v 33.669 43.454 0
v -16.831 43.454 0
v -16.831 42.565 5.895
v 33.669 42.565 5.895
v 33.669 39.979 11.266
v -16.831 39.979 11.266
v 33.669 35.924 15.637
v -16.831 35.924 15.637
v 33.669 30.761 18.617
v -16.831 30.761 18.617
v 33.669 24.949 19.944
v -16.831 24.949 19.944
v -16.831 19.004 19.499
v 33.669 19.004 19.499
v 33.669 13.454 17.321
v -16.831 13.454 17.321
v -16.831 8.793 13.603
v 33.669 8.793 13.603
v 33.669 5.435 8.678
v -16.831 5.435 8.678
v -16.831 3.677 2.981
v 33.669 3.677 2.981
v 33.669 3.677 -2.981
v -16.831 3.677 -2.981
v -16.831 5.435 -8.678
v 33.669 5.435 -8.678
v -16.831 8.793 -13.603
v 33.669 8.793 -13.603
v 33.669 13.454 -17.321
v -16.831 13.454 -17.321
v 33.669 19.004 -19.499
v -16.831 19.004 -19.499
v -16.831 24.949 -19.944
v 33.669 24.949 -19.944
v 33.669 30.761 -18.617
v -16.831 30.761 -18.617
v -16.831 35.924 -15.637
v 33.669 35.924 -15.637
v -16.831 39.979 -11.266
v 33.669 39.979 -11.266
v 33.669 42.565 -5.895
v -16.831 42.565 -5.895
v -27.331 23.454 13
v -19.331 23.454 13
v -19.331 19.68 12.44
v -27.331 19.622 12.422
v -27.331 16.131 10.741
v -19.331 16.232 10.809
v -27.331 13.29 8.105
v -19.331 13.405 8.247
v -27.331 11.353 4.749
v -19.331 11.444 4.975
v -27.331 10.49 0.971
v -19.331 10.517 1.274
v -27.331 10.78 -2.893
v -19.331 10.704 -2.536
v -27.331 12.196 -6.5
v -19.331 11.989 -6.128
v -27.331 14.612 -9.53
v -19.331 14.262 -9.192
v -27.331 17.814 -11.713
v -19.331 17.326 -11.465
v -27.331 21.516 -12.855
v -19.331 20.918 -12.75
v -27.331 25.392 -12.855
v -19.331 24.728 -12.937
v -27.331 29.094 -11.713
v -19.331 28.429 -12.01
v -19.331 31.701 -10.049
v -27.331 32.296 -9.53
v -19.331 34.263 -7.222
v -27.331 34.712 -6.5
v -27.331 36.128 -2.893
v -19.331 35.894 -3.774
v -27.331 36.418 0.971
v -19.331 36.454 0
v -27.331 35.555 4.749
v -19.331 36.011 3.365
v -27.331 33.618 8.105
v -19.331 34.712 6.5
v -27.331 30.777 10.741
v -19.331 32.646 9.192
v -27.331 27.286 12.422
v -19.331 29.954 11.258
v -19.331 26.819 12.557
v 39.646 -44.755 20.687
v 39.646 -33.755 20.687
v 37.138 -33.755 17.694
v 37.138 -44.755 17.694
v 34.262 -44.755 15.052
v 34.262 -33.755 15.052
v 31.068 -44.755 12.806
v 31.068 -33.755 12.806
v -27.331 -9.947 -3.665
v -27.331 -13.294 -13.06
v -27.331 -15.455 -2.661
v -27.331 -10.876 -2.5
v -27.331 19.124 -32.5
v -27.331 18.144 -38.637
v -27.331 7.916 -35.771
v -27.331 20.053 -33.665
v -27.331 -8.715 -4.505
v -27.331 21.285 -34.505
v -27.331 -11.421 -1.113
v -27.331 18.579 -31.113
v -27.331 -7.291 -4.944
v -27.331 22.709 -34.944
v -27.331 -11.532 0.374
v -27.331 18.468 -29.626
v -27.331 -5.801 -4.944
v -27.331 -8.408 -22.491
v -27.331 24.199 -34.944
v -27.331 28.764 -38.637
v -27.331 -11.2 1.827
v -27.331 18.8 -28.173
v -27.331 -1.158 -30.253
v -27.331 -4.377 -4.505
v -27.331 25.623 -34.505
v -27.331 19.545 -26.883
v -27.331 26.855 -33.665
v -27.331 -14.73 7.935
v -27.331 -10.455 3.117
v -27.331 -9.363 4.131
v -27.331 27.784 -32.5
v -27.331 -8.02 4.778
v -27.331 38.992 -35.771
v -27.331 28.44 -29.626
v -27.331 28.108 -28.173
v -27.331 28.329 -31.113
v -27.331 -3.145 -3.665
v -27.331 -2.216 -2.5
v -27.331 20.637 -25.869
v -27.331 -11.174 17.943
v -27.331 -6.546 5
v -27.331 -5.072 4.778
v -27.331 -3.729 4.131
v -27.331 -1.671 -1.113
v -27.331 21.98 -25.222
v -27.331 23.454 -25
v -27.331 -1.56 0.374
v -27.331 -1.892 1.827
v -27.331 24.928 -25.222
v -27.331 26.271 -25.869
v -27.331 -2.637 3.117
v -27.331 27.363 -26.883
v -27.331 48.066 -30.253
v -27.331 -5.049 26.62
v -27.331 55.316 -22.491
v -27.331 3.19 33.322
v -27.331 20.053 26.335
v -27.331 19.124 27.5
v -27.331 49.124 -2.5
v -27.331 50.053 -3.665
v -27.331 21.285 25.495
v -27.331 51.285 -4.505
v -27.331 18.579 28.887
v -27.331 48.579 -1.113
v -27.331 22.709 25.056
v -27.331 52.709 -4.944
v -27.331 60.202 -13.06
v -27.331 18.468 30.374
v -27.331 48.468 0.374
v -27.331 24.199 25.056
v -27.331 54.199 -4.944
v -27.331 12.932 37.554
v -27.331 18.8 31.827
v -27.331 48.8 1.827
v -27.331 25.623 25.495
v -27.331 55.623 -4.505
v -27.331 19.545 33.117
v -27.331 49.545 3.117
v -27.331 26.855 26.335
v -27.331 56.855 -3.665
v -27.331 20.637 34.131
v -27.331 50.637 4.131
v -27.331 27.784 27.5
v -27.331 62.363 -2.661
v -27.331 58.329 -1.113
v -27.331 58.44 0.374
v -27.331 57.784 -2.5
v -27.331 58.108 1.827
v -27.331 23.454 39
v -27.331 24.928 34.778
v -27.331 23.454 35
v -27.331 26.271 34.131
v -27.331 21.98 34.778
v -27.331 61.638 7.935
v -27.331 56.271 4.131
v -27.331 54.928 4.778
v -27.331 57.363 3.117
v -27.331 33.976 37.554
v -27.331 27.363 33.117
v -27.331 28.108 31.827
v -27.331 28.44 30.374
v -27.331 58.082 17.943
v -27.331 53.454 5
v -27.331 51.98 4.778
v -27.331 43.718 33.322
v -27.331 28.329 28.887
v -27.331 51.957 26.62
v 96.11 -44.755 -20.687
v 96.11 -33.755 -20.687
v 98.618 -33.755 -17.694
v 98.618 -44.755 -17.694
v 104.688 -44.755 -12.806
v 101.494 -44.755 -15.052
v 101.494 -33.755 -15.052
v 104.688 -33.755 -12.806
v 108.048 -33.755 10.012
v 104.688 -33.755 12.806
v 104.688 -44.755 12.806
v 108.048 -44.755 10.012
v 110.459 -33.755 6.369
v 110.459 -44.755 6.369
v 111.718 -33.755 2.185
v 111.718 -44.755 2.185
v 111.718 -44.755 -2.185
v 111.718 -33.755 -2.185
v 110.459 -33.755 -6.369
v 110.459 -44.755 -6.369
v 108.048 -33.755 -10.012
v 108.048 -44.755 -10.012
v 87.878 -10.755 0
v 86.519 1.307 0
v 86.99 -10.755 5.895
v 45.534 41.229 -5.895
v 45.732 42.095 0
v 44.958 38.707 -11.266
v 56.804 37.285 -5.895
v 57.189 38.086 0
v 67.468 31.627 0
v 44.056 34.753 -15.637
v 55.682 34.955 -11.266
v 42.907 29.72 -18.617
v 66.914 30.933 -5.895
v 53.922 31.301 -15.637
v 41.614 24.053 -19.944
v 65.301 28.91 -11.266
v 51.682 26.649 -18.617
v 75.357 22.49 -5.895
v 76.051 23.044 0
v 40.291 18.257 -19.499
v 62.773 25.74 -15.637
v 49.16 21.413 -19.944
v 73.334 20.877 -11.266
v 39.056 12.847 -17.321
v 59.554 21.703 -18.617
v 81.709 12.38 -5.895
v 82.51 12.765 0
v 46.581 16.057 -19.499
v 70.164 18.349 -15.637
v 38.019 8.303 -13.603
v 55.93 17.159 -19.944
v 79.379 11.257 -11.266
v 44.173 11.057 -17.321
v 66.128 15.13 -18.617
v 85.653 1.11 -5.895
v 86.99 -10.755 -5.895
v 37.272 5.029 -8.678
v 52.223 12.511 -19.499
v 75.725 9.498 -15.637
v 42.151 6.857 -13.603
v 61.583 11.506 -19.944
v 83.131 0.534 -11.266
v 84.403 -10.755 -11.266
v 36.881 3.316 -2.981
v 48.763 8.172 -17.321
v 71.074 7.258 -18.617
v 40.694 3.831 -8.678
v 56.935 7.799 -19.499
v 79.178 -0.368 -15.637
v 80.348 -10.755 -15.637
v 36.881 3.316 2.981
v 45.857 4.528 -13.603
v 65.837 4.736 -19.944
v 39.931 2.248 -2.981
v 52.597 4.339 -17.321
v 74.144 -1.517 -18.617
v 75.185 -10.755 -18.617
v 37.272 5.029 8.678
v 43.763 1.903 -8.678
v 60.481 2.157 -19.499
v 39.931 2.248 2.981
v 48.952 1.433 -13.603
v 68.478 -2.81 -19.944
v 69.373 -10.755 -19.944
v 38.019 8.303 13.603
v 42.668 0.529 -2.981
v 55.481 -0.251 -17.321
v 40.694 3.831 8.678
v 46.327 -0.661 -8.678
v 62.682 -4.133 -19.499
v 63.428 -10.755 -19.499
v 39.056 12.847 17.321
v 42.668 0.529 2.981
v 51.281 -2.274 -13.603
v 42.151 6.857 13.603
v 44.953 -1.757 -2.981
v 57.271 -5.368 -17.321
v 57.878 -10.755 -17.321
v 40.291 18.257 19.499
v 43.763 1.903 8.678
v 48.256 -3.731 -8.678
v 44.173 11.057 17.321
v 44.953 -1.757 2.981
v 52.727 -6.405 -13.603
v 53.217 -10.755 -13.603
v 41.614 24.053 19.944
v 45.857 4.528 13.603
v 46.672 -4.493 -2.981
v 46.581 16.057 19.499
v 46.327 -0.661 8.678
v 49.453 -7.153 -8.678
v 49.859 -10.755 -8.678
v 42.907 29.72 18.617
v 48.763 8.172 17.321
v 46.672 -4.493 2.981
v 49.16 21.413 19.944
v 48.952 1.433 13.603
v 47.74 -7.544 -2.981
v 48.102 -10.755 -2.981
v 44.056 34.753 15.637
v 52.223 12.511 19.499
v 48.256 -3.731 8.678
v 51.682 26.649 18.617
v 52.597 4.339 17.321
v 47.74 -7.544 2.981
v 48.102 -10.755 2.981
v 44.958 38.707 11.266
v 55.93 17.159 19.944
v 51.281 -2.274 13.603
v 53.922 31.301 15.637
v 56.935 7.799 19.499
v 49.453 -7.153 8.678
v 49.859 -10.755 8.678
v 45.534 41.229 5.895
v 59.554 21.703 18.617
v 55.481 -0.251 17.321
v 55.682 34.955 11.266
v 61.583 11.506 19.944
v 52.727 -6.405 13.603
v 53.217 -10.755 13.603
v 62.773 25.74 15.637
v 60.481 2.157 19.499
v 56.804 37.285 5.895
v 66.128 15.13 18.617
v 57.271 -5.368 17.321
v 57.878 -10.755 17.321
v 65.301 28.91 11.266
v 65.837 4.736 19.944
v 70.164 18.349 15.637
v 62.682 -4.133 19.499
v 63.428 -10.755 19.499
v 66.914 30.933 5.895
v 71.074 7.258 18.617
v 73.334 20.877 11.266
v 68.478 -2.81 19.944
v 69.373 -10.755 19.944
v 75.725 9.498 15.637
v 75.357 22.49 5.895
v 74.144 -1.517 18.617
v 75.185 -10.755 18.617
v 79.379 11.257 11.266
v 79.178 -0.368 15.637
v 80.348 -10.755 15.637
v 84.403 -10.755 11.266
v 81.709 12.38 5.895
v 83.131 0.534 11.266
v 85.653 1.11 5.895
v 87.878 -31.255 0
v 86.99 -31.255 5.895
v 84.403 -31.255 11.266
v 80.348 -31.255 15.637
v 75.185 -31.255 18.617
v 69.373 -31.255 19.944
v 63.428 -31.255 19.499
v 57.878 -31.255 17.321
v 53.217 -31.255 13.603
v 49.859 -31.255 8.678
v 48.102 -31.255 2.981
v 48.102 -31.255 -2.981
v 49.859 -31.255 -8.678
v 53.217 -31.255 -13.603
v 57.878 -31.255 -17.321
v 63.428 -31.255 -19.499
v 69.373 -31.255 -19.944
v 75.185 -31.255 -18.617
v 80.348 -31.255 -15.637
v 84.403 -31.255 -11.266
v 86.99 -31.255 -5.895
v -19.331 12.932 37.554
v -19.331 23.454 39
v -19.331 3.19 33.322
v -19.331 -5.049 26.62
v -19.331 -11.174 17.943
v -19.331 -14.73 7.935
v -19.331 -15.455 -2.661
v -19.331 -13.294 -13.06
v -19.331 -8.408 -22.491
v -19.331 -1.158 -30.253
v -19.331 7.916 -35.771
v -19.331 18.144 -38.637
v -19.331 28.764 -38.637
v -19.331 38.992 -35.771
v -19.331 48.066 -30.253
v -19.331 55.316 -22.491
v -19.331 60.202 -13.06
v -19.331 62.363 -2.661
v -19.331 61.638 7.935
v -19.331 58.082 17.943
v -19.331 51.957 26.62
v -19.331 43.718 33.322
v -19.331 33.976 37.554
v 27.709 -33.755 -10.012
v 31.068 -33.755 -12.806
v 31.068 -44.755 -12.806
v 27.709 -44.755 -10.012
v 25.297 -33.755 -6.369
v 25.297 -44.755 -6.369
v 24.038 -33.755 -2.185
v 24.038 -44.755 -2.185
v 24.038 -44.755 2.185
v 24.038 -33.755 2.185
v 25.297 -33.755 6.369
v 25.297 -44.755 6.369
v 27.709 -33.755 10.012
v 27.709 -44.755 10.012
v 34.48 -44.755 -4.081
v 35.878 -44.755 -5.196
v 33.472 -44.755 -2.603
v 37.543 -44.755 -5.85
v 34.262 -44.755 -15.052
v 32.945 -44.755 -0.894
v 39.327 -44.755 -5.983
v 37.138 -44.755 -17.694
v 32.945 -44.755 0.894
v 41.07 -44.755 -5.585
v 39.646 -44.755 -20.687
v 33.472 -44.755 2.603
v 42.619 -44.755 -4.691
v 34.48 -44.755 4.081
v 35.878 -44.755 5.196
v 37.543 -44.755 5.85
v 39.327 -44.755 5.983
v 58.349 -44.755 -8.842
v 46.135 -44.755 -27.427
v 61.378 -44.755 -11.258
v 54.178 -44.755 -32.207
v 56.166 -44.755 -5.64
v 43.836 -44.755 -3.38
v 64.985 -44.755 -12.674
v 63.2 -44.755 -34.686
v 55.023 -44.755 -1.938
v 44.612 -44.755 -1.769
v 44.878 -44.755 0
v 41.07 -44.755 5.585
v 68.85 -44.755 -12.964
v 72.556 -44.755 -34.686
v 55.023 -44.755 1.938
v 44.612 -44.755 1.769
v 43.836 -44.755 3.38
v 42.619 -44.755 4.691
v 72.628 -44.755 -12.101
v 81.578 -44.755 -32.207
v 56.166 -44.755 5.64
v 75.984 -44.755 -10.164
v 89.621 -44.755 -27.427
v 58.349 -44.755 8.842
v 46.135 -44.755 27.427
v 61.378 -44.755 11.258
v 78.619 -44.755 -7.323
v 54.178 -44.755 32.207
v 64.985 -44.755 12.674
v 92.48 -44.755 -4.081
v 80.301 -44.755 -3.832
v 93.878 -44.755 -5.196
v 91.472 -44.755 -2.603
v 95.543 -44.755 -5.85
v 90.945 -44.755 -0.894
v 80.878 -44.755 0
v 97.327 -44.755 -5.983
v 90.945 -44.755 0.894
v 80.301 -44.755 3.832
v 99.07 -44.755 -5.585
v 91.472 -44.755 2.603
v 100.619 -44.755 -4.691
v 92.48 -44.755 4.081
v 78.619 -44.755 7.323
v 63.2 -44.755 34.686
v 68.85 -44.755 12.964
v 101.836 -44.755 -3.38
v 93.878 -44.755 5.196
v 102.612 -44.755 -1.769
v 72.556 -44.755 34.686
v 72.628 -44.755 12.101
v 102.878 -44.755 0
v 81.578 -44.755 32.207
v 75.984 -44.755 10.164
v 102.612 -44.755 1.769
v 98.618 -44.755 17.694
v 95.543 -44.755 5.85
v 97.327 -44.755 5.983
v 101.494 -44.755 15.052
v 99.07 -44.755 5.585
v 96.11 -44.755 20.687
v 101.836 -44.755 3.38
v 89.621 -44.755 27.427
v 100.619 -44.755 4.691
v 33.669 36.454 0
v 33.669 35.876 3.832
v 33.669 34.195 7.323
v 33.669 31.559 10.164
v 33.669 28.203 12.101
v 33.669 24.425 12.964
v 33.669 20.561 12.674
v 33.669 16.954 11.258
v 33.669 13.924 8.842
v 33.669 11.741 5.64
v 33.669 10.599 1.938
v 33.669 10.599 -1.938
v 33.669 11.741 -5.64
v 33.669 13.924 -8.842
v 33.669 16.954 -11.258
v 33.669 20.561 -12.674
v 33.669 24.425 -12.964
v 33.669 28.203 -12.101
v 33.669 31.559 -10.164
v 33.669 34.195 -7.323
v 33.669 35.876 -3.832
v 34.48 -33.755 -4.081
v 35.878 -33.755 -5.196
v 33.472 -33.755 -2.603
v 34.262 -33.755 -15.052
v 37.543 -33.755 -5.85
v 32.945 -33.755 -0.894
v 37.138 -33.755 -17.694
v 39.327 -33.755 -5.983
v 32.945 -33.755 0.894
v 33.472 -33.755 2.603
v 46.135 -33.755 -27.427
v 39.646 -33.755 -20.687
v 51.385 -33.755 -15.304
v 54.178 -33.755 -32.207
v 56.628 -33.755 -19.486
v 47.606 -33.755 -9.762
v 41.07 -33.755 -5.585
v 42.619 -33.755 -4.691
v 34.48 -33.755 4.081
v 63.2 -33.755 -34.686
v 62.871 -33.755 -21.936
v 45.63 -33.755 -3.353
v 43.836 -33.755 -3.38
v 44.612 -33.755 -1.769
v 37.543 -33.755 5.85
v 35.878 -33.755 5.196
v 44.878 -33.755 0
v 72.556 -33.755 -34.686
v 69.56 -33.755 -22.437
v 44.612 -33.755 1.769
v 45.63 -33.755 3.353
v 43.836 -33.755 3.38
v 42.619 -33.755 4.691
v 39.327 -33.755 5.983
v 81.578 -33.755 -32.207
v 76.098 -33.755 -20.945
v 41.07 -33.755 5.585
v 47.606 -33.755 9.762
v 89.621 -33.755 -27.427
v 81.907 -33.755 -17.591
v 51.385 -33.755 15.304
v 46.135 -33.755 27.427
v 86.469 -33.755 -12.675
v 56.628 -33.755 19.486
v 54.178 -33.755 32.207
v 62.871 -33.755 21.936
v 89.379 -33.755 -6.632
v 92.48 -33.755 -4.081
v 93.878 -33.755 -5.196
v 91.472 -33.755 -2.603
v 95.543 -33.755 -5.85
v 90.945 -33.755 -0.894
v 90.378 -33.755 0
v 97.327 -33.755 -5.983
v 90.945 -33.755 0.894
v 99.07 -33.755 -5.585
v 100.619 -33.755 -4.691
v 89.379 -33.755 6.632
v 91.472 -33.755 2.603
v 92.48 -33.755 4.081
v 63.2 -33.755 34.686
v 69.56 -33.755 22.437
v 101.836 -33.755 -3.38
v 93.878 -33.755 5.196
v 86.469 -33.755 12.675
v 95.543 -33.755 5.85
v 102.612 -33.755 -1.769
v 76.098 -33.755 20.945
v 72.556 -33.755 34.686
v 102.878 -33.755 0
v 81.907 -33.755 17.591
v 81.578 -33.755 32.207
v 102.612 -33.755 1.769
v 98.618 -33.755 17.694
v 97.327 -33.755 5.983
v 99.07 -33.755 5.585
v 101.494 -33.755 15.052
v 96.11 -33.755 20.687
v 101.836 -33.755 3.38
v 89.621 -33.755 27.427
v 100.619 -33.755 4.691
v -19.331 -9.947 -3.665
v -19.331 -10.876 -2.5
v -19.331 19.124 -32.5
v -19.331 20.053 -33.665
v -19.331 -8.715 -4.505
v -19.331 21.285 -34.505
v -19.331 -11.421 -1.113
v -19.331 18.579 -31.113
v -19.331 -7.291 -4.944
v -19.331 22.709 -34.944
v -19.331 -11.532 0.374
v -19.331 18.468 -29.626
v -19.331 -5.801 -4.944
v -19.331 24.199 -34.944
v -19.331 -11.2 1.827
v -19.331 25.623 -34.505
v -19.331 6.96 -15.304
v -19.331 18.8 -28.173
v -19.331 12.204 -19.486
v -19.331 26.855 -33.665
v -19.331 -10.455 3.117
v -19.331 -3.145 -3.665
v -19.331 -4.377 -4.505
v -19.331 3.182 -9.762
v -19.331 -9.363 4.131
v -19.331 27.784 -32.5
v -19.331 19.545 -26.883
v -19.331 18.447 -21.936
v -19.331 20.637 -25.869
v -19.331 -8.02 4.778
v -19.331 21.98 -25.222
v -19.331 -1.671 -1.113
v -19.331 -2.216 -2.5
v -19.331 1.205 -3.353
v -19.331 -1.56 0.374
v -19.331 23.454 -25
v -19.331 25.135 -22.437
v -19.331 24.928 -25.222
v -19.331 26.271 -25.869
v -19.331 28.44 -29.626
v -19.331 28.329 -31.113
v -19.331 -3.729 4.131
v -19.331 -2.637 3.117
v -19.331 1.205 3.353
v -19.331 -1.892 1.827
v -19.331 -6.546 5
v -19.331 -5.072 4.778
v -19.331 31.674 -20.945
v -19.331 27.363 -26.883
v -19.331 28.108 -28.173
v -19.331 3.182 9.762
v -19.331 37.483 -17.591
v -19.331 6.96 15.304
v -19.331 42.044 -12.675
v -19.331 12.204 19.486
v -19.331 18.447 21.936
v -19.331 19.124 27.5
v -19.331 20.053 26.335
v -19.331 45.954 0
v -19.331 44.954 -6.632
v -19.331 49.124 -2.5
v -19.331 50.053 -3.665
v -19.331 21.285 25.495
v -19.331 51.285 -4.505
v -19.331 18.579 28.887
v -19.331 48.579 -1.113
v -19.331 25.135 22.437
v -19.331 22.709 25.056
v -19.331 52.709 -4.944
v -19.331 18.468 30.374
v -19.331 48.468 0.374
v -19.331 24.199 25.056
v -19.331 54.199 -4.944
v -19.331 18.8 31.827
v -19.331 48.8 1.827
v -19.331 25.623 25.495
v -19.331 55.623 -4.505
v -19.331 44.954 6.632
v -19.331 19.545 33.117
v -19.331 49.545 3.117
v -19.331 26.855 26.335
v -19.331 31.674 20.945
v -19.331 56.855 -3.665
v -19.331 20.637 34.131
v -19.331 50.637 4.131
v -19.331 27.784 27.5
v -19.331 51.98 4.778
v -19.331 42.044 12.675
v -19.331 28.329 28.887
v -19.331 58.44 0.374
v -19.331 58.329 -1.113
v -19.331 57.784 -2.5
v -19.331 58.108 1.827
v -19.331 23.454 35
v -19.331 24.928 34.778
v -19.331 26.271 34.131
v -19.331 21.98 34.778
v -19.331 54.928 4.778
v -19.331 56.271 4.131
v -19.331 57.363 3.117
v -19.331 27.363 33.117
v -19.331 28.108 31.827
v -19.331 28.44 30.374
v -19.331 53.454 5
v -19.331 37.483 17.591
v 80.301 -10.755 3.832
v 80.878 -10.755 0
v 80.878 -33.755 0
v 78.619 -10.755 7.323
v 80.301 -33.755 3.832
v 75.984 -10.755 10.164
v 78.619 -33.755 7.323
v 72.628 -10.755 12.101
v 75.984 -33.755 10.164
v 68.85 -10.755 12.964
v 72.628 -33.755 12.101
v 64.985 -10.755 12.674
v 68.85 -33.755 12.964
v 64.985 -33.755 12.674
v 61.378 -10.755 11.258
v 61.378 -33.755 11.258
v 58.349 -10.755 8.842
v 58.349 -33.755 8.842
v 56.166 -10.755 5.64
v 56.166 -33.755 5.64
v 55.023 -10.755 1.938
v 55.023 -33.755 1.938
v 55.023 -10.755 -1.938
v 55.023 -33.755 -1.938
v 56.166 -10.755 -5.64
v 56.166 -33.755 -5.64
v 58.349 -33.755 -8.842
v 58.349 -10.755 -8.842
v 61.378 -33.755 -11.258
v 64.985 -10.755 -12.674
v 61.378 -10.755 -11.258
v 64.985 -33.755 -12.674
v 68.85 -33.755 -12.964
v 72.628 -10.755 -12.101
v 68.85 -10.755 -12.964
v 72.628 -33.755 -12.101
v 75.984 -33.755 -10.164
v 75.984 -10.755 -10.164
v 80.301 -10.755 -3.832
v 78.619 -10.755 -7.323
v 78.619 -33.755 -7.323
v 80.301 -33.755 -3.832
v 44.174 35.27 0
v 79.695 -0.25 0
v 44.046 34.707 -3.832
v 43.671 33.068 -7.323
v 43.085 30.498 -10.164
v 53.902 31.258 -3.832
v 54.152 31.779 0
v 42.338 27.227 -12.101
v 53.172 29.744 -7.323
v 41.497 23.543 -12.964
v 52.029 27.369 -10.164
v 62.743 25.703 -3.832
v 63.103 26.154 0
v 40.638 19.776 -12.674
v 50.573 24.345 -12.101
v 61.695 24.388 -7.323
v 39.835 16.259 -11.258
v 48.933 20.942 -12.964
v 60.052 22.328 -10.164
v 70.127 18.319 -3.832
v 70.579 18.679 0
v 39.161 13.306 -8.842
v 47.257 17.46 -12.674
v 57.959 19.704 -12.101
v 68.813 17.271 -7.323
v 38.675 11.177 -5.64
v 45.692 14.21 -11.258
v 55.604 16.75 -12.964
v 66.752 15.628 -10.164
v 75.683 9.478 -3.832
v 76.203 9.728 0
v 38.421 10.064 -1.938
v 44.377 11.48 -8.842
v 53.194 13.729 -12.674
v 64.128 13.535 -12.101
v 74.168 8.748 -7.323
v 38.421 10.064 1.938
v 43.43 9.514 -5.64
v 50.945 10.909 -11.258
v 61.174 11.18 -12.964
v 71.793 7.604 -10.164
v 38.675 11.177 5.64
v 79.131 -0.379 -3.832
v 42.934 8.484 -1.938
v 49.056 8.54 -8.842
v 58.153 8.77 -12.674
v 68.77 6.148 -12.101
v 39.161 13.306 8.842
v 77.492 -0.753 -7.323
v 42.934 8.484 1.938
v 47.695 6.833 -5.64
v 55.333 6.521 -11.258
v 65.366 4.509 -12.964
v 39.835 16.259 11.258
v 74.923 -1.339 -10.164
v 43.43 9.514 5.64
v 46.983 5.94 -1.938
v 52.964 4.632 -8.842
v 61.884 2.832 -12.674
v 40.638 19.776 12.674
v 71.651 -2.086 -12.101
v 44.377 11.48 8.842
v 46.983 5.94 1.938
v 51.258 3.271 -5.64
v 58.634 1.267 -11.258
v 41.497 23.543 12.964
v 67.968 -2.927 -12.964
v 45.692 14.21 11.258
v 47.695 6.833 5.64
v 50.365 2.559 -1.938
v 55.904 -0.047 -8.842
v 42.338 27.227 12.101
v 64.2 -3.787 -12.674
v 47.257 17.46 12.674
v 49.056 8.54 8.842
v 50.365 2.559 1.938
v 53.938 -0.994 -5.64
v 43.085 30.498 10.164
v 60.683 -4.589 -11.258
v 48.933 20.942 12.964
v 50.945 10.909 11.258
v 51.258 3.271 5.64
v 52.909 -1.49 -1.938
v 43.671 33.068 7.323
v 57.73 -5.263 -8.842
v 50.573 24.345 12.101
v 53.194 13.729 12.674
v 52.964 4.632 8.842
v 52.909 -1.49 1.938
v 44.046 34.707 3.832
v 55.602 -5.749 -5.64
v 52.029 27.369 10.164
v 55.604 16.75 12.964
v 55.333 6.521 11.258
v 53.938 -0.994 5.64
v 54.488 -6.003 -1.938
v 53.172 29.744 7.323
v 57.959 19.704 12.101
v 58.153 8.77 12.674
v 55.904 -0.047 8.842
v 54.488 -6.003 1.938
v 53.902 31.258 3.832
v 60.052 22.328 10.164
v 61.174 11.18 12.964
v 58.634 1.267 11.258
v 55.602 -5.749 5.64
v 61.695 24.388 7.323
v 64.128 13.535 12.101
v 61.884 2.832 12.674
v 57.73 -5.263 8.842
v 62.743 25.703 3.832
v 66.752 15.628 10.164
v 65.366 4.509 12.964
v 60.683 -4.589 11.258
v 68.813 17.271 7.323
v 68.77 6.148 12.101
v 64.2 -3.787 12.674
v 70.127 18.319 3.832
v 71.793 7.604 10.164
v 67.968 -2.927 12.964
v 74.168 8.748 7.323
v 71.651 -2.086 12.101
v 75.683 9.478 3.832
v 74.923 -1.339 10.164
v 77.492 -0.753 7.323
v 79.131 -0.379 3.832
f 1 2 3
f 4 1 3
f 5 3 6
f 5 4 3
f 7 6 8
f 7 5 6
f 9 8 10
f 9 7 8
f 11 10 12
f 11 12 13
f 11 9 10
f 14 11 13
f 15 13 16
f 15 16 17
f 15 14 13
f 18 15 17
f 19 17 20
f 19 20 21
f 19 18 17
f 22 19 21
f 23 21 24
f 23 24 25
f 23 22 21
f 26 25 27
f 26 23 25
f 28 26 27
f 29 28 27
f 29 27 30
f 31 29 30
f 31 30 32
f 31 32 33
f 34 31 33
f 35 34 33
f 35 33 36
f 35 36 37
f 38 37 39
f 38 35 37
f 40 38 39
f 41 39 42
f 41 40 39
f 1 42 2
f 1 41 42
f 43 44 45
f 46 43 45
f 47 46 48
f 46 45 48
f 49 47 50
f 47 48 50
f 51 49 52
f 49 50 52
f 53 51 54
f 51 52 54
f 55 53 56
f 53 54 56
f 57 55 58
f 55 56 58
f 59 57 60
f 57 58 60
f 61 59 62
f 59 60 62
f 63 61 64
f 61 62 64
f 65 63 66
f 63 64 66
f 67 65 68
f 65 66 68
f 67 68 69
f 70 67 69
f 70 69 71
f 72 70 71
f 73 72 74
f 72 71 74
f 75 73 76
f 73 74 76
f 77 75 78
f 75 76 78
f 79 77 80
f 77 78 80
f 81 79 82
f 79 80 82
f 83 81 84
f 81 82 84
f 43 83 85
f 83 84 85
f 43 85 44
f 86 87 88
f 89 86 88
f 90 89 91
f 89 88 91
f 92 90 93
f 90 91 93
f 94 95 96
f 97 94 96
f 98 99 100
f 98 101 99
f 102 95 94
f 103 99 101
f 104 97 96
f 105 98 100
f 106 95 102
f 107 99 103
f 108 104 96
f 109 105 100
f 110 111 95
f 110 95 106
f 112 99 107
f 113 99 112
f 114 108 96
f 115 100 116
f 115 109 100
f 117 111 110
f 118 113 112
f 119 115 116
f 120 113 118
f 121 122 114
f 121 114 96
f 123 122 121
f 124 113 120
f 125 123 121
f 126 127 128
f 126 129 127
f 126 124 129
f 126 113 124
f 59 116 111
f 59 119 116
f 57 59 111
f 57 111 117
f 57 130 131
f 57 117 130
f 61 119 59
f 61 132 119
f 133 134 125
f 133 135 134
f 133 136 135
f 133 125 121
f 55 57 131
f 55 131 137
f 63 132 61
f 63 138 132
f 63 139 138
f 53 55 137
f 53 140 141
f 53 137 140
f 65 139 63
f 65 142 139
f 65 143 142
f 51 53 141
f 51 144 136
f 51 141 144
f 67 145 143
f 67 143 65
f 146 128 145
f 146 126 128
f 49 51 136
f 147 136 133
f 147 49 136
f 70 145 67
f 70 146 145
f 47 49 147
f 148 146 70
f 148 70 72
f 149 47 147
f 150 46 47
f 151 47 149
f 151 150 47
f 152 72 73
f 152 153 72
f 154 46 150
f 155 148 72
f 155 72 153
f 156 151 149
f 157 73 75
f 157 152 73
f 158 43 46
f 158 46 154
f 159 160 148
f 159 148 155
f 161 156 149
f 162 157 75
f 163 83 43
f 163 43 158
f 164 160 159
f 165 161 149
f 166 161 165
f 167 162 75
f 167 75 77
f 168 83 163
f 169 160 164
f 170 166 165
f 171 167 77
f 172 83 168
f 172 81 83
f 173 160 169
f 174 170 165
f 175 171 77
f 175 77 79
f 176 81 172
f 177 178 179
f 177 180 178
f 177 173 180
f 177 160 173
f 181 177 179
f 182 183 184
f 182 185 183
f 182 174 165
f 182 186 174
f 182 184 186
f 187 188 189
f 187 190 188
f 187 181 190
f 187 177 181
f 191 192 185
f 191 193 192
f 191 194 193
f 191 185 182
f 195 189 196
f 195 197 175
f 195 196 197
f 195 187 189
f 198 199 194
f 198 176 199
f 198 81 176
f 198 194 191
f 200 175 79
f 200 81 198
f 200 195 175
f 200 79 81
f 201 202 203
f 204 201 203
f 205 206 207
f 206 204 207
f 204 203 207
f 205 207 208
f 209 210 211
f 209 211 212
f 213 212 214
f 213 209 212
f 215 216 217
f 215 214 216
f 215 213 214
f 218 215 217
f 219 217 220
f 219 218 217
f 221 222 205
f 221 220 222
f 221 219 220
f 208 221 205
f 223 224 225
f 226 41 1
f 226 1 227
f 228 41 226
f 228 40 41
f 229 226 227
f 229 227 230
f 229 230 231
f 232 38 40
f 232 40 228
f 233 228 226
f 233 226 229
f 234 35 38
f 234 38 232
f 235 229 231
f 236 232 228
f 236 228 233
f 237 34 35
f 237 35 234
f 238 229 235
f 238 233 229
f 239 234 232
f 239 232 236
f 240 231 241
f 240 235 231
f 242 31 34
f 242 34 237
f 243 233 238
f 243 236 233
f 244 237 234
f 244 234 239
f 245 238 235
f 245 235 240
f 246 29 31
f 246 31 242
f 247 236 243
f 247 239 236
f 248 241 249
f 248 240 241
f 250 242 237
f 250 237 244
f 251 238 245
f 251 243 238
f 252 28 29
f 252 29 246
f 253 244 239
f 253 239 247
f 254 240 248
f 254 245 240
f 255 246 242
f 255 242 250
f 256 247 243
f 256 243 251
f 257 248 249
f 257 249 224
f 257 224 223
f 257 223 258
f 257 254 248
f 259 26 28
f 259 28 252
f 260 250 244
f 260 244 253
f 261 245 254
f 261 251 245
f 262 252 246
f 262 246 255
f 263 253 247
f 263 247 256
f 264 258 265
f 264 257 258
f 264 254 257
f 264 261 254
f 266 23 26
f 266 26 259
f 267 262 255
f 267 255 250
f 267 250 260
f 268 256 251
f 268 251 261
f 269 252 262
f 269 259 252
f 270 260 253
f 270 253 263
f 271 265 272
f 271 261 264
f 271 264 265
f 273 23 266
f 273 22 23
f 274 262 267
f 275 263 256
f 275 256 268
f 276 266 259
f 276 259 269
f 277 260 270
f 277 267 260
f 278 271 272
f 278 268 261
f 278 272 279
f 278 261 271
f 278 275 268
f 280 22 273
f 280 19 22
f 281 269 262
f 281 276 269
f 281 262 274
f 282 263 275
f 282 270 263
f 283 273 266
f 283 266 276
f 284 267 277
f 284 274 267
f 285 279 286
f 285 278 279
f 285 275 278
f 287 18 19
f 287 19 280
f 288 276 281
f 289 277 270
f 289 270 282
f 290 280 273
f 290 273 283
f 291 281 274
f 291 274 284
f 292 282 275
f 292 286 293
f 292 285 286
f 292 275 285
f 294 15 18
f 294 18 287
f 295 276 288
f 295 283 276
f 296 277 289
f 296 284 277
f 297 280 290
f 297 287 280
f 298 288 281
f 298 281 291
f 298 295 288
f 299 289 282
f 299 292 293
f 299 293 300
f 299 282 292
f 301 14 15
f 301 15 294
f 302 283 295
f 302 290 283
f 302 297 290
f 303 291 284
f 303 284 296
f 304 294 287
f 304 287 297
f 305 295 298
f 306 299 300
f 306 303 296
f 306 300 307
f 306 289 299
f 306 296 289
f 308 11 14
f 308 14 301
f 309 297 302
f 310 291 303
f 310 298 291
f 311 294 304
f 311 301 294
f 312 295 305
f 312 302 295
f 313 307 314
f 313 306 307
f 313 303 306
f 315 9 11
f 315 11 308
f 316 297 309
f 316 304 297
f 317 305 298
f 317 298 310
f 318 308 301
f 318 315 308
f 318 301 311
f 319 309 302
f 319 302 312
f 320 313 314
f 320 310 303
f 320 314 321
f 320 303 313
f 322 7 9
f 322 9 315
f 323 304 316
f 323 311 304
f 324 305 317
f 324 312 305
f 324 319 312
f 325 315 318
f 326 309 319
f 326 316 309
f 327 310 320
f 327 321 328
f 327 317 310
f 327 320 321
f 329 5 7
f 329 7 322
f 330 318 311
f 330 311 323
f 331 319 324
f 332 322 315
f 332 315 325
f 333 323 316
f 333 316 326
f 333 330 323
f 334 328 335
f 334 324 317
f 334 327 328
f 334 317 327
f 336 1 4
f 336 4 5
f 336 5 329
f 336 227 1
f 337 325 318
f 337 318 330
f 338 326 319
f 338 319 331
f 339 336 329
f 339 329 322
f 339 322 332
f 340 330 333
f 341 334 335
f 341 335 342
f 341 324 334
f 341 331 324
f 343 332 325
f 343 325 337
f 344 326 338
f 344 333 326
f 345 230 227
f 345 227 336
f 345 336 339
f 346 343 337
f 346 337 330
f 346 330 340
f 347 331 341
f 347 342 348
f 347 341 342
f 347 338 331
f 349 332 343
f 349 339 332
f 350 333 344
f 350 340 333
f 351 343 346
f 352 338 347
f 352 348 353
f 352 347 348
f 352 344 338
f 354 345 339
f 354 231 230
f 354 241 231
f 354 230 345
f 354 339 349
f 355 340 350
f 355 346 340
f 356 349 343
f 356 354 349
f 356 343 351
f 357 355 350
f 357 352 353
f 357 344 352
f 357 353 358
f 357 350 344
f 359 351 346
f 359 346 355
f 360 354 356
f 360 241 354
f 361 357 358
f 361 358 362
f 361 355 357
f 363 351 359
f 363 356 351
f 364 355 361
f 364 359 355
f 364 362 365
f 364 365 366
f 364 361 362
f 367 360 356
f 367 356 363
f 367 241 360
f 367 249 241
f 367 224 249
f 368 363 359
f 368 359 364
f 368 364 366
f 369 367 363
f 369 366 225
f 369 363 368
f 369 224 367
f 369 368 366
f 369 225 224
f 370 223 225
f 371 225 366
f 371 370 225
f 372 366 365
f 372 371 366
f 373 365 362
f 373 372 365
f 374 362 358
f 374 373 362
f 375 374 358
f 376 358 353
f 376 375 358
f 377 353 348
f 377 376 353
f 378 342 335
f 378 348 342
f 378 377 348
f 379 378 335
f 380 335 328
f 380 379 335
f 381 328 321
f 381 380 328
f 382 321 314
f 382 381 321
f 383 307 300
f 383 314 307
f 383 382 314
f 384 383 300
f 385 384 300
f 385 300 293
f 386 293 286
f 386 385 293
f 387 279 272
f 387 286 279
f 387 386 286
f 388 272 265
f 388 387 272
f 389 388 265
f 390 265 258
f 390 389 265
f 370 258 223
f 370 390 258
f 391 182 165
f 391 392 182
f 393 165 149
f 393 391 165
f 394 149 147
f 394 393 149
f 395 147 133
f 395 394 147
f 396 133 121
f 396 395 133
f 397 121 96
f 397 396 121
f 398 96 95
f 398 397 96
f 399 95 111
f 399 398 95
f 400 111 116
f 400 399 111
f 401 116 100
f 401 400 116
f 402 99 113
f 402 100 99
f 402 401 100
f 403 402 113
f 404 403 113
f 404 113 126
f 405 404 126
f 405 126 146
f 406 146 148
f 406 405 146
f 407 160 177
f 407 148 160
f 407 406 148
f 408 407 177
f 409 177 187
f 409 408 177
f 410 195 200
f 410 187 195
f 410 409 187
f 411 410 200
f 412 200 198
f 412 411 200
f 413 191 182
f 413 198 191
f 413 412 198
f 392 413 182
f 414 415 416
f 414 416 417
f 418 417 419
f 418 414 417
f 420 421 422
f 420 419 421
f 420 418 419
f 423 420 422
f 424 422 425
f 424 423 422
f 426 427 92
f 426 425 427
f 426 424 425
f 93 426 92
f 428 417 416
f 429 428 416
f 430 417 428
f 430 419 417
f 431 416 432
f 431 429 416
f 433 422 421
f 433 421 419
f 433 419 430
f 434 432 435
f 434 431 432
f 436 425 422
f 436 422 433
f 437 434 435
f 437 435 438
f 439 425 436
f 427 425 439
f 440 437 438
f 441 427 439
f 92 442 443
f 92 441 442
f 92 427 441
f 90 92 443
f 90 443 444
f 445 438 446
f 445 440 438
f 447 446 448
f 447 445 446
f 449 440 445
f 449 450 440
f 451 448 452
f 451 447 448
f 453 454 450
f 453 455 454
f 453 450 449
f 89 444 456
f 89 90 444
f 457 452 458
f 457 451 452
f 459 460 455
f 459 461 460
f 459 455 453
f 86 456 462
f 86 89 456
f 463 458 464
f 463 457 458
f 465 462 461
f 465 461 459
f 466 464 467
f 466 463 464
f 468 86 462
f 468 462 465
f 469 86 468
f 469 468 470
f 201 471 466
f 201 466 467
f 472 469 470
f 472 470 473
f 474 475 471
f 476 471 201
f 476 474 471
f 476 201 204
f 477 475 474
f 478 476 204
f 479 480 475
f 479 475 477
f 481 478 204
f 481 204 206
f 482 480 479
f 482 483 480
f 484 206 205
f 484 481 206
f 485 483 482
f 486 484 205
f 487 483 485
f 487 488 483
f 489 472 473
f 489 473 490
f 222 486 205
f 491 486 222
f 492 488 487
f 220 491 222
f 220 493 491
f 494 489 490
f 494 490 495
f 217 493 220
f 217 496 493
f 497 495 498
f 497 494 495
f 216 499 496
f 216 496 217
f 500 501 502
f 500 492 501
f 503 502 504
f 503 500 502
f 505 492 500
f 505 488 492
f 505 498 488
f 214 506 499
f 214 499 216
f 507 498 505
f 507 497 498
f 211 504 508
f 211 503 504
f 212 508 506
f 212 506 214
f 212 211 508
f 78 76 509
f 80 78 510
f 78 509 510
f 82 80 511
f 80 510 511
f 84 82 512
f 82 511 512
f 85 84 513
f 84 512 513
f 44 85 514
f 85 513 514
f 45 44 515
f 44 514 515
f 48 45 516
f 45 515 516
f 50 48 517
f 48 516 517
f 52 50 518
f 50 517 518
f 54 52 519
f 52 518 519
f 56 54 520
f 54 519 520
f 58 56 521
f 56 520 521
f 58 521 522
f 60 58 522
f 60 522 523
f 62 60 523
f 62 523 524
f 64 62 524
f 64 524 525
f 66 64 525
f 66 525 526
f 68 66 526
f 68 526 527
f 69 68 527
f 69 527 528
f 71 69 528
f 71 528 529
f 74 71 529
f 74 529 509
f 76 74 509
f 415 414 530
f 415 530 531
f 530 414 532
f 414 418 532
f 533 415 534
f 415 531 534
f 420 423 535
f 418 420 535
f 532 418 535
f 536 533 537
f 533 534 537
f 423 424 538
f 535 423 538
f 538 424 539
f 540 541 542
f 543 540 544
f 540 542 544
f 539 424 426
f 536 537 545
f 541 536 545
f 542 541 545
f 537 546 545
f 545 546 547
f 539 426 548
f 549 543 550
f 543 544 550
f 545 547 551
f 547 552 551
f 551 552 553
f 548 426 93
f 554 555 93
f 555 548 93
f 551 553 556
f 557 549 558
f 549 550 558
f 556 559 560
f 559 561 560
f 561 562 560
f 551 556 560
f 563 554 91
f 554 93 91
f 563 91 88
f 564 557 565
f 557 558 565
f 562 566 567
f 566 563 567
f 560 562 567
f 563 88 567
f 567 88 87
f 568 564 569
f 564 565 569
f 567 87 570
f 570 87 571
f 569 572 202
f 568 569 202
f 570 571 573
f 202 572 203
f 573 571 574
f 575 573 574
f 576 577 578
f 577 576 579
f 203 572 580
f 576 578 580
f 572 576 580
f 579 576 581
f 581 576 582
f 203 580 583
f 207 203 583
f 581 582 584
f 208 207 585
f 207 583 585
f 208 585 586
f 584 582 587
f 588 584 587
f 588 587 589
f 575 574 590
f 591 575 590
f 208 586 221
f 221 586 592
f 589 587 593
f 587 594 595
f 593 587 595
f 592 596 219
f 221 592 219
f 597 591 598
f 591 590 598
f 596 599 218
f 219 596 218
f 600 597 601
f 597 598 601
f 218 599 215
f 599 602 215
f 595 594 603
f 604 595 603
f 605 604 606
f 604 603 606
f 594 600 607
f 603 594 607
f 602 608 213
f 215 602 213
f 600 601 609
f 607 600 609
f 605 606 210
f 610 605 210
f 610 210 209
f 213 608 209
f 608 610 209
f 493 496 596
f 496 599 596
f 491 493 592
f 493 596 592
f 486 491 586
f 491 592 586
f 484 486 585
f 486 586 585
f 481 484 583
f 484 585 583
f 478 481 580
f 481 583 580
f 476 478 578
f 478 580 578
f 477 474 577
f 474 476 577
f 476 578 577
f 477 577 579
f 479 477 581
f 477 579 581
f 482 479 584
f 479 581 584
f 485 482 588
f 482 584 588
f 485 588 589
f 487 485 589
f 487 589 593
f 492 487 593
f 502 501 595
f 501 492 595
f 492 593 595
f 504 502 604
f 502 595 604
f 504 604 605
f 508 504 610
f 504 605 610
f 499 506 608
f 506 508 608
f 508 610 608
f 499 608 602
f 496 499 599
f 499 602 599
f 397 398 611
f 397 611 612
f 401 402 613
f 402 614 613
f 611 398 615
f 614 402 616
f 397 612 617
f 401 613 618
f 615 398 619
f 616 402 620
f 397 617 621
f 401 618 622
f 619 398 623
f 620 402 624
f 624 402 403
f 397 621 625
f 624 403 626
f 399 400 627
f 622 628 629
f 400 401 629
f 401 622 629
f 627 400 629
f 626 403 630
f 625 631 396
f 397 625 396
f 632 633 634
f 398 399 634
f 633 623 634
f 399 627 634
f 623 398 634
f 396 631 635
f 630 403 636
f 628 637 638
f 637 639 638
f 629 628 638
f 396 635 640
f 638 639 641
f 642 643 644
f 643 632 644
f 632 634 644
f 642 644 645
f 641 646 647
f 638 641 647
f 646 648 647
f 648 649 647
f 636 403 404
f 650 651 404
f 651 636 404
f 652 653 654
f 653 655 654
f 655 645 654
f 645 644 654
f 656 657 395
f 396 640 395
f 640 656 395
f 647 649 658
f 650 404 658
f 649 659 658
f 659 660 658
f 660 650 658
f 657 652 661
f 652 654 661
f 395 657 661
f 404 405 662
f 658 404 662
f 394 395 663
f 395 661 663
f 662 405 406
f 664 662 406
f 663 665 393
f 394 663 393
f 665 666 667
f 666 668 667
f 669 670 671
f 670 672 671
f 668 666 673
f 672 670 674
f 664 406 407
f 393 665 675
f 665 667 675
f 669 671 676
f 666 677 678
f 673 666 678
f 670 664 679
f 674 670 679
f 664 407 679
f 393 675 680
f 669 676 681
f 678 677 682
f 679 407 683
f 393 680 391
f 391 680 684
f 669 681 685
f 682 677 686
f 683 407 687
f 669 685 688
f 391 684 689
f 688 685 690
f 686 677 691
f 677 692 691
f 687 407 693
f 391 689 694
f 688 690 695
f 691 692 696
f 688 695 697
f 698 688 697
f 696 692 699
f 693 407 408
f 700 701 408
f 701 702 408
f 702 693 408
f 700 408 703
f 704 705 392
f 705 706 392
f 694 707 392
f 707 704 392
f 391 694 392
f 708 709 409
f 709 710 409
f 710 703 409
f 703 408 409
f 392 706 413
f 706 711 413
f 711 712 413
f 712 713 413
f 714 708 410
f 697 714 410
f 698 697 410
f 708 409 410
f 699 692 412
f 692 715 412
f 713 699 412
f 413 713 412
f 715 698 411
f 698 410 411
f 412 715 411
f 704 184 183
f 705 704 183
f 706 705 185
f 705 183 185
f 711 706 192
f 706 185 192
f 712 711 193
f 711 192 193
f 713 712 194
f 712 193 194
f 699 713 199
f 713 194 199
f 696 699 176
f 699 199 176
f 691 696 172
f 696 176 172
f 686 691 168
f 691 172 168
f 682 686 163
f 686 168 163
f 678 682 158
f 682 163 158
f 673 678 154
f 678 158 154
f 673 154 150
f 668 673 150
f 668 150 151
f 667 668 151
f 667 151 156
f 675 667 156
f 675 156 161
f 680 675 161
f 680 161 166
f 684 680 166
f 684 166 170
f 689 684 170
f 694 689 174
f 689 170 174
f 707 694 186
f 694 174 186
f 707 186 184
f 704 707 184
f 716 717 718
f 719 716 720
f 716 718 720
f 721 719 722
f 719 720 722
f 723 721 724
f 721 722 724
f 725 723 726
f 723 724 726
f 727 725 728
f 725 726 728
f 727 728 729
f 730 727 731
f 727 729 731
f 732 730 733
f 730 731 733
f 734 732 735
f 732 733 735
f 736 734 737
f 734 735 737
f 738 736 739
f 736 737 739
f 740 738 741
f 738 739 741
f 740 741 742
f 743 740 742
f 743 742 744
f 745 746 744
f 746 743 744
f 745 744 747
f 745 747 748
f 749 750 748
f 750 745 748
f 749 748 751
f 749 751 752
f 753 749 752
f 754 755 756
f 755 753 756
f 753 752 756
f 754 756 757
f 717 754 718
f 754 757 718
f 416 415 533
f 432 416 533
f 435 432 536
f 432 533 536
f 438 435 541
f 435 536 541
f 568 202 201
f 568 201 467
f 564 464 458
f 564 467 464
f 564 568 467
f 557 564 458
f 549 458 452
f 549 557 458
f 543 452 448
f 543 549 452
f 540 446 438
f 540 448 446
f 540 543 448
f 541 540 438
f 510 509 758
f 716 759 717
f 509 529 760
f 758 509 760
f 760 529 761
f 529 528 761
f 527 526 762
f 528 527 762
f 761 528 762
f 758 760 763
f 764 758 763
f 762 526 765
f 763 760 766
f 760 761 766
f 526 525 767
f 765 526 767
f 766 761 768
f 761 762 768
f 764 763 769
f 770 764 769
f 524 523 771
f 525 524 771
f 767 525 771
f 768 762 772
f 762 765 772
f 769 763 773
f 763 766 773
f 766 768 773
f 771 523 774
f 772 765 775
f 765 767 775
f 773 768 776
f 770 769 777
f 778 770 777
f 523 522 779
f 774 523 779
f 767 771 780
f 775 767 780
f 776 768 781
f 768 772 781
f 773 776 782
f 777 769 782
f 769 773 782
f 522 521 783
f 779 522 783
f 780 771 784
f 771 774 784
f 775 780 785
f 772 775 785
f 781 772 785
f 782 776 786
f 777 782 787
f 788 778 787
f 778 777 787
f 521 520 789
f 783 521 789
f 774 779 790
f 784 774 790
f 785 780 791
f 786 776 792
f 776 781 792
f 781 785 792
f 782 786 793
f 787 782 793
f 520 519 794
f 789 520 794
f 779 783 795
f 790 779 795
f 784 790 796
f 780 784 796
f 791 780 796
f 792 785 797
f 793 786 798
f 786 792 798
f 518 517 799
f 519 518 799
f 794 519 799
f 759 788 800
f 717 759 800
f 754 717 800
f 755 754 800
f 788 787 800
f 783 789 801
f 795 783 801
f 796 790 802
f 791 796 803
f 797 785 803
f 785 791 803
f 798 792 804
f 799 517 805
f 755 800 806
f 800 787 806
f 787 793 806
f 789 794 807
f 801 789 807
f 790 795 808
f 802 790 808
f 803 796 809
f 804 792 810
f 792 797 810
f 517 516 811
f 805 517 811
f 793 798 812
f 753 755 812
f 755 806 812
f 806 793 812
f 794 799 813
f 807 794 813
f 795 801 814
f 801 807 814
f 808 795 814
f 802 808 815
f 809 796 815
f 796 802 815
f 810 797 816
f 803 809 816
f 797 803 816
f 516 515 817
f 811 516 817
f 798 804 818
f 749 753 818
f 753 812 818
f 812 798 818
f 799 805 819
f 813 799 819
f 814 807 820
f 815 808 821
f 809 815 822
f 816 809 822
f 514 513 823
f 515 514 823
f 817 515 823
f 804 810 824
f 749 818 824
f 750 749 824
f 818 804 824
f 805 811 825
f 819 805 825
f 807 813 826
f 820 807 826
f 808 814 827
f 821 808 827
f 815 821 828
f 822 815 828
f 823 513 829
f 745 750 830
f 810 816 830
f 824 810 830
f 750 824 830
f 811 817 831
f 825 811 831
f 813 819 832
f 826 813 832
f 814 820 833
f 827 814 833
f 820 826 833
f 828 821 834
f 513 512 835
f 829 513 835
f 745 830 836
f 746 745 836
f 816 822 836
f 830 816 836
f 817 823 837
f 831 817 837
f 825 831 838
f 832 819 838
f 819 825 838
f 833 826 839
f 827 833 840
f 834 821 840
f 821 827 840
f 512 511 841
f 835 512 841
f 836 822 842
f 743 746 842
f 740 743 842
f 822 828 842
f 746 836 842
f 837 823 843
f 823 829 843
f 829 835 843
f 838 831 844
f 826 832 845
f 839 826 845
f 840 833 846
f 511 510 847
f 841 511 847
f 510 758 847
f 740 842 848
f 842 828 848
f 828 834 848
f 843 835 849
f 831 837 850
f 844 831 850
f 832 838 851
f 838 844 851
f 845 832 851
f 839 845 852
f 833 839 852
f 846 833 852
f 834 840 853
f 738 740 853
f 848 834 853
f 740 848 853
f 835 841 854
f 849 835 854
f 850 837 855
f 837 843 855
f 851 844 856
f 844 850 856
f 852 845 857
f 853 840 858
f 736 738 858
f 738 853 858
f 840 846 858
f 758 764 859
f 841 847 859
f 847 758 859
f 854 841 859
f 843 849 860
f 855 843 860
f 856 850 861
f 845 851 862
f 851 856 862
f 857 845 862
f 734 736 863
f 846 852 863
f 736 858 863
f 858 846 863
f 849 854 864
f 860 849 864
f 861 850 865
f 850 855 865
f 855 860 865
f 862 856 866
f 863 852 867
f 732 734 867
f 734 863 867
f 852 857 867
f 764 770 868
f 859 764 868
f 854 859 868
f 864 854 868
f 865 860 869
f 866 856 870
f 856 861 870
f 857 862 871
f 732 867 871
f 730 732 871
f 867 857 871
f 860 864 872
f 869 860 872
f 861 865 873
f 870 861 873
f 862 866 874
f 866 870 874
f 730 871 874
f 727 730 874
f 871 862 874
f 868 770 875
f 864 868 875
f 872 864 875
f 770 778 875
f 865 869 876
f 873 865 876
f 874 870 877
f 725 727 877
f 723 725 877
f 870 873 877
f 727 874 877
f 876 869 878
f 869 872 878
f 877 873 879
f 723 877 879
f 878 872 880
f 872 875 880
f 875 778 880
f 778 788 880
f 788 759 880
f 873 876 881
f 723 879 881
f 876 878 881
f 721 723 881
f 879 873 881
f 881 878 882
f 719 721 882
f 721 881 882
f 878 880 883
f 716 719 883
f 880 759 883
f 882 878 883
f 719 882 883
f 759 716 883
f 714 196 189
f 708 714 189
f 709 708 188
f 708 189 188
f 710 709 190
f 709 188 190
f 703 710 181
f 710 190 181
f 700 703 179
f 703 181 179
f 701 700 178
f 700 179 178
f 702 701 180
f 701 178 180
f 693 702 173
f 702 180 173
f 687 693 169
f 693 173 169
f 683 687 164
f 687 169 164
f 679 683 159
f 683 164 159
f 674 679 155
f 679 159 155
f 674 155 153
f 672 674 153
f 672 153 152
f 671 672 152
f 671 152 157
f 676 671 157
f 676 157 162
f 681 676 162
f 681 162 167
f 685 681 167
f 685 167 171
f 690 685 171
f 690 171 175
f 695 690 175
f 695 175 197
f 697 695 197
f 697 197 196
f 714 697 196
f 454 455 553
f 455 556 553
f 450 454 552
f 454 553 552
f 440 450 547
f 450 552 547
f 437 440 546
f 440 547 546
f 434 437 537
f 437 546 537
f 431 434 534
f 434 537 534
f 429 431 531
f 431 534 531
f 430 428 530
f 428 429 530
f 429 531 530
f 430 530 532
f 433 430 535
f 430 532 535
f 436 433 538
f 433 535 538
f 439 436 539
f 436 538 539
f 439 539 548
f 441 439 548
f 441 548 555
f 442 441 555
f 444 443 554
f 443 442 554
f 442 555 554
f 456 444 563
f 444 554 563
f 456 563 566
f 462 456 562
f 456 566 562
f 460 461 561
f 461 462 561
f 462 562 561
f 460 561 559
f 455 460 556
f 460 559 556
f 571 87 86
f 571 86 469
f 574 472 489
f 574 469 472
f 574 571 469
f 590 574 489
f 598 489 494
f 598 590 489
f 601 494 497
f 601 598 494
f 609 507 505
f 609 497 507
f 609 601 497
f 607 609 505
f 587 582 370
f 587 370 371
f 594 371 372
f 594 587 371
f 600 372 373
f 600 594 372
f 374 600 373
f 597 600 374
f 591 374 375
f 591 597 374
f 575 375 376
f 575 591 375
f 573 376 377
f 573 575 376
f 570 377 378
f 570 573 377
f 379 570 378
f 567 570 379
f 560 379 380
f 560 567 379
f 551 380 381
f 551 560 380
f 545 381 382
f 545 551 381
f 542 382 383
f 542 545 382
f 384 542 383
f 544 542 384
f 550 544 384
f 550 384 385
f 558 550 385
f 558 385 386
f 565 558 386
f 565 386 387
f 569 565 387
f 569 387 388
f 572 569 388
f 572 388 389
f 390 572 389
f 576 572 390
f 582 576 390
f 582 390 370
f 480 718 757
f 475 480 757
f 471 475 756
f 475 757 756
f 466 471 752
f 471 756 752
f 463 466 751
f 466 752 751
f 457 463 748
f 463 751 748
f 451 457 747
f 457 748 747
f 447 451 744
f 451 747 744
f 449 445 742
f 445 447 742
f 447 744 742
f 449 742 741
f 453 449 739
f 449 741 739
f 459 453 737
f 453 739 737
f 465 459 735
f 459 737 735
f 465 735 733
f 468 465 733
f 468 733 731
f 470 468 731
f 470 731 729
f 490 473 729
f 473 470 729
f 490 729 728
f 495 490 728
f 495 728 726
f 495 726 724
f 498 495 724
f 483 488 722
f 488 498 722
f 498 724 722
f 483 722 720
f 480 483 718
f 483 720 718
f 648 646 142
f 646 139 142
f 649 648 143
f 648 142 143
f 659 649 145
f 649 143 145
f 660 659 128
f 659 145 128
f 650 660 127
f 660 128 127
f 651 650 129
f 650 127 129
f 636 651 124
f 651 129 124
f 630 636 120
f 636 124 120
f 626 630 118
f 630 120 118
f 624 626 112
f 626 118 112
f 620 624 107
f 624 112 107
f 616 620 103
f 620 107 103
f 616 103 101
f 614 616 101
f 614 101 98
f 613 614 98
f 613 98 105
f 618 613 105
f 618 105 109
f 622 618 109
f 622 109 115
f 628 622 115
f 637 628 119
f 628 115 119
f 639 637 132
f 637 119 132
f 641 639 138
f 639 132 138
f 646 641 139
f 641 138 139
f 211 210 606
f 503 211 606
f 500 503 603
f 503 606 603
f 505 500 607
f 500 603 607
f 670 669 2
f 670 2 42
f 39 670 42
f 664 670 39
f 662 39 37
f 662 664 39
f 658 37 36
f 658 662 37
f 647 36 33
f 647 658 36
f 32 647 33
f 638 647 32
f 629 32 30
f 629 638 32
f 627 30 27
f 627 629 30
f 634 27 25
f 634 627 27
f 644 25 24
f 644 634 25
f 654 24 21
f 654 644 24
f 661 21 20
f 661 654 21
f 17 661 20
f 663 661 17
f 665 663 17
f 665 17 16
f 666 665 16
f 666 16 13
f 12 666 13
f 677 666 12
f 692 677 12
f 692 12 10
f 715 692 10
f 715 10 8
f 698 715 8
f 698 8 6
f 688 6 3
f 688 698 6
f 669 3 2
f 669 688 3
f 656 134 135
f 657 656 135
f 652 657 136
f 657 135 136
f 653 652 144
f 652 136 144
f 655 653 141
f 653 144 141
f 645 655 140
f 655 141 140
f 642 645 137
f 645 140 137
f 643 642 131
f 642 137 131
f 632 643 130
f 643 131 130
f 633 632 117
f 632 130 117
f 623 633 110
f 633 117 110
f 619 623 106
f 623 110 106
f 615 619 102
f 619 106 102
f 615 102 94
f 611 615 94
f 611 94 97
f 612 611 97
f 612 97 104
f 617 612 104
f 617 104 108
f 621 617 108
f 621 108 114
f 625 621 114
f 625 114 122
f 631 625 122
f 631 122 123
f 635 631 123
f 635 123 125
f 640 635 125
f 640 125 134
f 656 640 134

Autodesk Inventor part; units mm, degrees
ref_plane "XZ Plane" through (0, 0, 0) normal (0, 1, 0) x (-1, 0, 0)
ref_plane "XY Plane" through (0, 0, 0) normal (0, 0, 1) x (1, 0, 0)
sketch "Sketch1" plane through (0, 0, 0) normal (0, 0, 1) x (1, 0, 0)
  line L0 (-244.3747, 73.9364) -> (-91.8552, 73.9364) construction
  line L1 (-91.8552, 73.9364) -> (-91.8552, -48.2612) construction
  line L2 (-91.8552, -48.2612) -> (-244.3747, -48.2612) construction
  line L3 (-244.3747, -48.2612) -> (-244.3747, 73.9364) construction
  line L4 (-19.331, 24.2448) -> (33.669, 24.2448)
  line L5 (68.669, -10.7552) -> (68.669, -33.7552)
  arc A0 (68.669, -10.7552) -> (33.669, 24.2448) centre (33.669, -10.7552) ccw
  point P0 (0, 0)
  dimension "d13" = 58
  dimension "d15" = 35
ref_plane "Work Plane1" through (-19.05, 0, 0) normal (1, 0, 0) x (0, 1, 0)
sketch "Sketch2" plane through (-19.05, 0, 0) normal (1, 0, 0) x (0, 1, 0)
  point P0 (0, 0)
sketch "Sketch3" plane through (-19.05, 0, 0) normal (1, 0, 0) x (0, 1, 0)
  circle A0 centre (23.454, 0) radius 20
  point P0 (0, 0)
  dimension "d16" = 40
sweep "Sweep1" add profiles "Sketch3" path "Sketch1"
shell "Shell1" thickness 7 removed faces 2 at (-19.331, 19.2276, 1.3227) at (61.9752, -33.7552, -3.0982)
sketch "Sketch4" plane through (-19.331, 23.454, 0) normal (-1, 0, 0) x (0, 0, 1)
  point P0 (0, -23.454)
sketch "Sketch5" plane through (-19.331, 23.454, 0) normal (-1, 0, 0) x (0, 0, 1)
  point P0 (0, -23.454)
sketch "Sketch6" plane through (-19.331, 23.454, 0) normal (-1, 0, 0) x (0, 0, 1)
  point P0 (0, -23.454)
sketch "Sketch7" plane through (-19.331, 23.454, 0) normal (-1, 0, 0) x (0, 0, 1)
  point P0 (0, -23.454)
sketch "Sketch8" plane through (-19.331, 23.454, 0) normal (-1, 0, 0) x (0, 0, 1)
  point P0 (0, -23.454)
sketch "Sketch9" plane through (-19.331, 23.454, 0) normal (-1, 0, 0) x (0, 0, 1)
  point P0 (0, -23.454)
sketch "Sketch10" plane through (-19.331, 23.454, 0) normal (-1, 0, 0) x (0, 0, 1)
  point P0 (0, -23.454)
sketch "Sketch11" plane through (-19.331, 23.454, 0) normal (-1, 0, 0) x (0, 0, 1)
  point P0 (0, -23.454)
sketch "Sketch12" plane through (-19.331, 23.454, 0) normal (-1, 0, 0) x (0, 0, 1)
  point P0 (0, -23.454)
sketch "Sketch13" plane through (-19.331, 23.454, 0) normal (-1, 0, 0) x (0, 0, 1)
  point P0 (0, -23.454)
sketch "Sketch14" plane through (-19.331, 23.454, 0) normal (-1, 0, 0) x (0, 0, 1)
  point P0 (0, -23.454)
sketch "Sketch15" plane through (-19.331, 23.454, 0) normal (-1, 0, 0) x (0, 0, 1)
  point P0 (0, -23.454)
sketch "Sketch16" plane through (-19.331, 23.454, 0) normal (-1, 0, 0) x (0, 0, 1)
  circle A0 centre (0, 0) radius 39
  circle A1 centre (0, 0) radius 13
  point P0 (0, -23.454)
  dimension "d20" = 78
  dimension "d21" = 26
extrude "Extrusion1" add sketch "Sketch16" along normal blind 8
sketch "Sketch17" plane through (-27.331, 23.454, 0) normal (-1, 0, 0) x (0, 0, 1)
  circle A0 centre (0, 30) radius 5
  circle A1 centre (0, 0) radius 13 projected
  circle A2 centre (-30, 0) radius 5
  circle A3 centre (0, -30) radius 5
  circle A4 centre (30, 0) radius 5
  point P0 (0, -23.454)
  dimension "d24" = 10
  dimension "d25" = 30
  dimension "d28" = 360
extrude "Extrusion2" cut sketch "Sketch17" against normal blind 8 contours A0 | A2 | A3 | A4
chamfer "Chamfer1" distance 2.5 angle 45 1 edges at (-19.331, 3.454, 0)
sketch "Sketch18" plane through (67.8782, -33.7552, 0) normal (0, -1, 0) x (1, 0, 0)
  circle A0 centre (0, 0) radius 13 projected
  circle A1 centre (0, 0) radius 13
  circle A2 centre (29, 0) radius 6
  arc A3 (36.8103, -12.8062) -> (36.8103, 12.8062) centre (29, 0) ccw
  arc A4 (28.2321, 20.6869) -> (36.8103, 12.8062) centre (52.431, 38.4186) ccw
  arc A5 (36.8103, -12.8062) -> (28.2321, -20.6869) centre (52.431, -38.4186) ccw
  circle A6 centre (-29, 0) radius 6
  arc A7 (-36.8103, 12.8062) -> (-36.8103, -12.8062) centre (-29, 0) ccw
  arc A8 (-36.8103, 12.8062) -> (-28.2321, 20.6869) centre (-52.431, 38.4186) ccw
  arc A9 (-28.2321, -20.6869) -> (-36.8103, -12.8062) centre (-52.431, -38.4186) ccw
  arc A10 (28.2321, 20.6869) -> (-28.2321, 20.6869) centre (0, 0) ccw
  arc A11 (-28.2321, -20.6869) -> (28.2321, -20.6869) centre (0, 0) ccw
  point P0 (-67.8782, 0)
  dimension "d36" = 26
  dimension "d38" = 12
  dimension "d39" = 29
  dimension "d41" = 30
  dimension "d42" = 29
extrude "Extrusion3" add sketch "Sketch18" along normal blind 11
chamfer "Chamfer2" distance 2.5 angle 45 1 edges at (47.8782, -33.7552, 0)
properties part number "cad@41"
